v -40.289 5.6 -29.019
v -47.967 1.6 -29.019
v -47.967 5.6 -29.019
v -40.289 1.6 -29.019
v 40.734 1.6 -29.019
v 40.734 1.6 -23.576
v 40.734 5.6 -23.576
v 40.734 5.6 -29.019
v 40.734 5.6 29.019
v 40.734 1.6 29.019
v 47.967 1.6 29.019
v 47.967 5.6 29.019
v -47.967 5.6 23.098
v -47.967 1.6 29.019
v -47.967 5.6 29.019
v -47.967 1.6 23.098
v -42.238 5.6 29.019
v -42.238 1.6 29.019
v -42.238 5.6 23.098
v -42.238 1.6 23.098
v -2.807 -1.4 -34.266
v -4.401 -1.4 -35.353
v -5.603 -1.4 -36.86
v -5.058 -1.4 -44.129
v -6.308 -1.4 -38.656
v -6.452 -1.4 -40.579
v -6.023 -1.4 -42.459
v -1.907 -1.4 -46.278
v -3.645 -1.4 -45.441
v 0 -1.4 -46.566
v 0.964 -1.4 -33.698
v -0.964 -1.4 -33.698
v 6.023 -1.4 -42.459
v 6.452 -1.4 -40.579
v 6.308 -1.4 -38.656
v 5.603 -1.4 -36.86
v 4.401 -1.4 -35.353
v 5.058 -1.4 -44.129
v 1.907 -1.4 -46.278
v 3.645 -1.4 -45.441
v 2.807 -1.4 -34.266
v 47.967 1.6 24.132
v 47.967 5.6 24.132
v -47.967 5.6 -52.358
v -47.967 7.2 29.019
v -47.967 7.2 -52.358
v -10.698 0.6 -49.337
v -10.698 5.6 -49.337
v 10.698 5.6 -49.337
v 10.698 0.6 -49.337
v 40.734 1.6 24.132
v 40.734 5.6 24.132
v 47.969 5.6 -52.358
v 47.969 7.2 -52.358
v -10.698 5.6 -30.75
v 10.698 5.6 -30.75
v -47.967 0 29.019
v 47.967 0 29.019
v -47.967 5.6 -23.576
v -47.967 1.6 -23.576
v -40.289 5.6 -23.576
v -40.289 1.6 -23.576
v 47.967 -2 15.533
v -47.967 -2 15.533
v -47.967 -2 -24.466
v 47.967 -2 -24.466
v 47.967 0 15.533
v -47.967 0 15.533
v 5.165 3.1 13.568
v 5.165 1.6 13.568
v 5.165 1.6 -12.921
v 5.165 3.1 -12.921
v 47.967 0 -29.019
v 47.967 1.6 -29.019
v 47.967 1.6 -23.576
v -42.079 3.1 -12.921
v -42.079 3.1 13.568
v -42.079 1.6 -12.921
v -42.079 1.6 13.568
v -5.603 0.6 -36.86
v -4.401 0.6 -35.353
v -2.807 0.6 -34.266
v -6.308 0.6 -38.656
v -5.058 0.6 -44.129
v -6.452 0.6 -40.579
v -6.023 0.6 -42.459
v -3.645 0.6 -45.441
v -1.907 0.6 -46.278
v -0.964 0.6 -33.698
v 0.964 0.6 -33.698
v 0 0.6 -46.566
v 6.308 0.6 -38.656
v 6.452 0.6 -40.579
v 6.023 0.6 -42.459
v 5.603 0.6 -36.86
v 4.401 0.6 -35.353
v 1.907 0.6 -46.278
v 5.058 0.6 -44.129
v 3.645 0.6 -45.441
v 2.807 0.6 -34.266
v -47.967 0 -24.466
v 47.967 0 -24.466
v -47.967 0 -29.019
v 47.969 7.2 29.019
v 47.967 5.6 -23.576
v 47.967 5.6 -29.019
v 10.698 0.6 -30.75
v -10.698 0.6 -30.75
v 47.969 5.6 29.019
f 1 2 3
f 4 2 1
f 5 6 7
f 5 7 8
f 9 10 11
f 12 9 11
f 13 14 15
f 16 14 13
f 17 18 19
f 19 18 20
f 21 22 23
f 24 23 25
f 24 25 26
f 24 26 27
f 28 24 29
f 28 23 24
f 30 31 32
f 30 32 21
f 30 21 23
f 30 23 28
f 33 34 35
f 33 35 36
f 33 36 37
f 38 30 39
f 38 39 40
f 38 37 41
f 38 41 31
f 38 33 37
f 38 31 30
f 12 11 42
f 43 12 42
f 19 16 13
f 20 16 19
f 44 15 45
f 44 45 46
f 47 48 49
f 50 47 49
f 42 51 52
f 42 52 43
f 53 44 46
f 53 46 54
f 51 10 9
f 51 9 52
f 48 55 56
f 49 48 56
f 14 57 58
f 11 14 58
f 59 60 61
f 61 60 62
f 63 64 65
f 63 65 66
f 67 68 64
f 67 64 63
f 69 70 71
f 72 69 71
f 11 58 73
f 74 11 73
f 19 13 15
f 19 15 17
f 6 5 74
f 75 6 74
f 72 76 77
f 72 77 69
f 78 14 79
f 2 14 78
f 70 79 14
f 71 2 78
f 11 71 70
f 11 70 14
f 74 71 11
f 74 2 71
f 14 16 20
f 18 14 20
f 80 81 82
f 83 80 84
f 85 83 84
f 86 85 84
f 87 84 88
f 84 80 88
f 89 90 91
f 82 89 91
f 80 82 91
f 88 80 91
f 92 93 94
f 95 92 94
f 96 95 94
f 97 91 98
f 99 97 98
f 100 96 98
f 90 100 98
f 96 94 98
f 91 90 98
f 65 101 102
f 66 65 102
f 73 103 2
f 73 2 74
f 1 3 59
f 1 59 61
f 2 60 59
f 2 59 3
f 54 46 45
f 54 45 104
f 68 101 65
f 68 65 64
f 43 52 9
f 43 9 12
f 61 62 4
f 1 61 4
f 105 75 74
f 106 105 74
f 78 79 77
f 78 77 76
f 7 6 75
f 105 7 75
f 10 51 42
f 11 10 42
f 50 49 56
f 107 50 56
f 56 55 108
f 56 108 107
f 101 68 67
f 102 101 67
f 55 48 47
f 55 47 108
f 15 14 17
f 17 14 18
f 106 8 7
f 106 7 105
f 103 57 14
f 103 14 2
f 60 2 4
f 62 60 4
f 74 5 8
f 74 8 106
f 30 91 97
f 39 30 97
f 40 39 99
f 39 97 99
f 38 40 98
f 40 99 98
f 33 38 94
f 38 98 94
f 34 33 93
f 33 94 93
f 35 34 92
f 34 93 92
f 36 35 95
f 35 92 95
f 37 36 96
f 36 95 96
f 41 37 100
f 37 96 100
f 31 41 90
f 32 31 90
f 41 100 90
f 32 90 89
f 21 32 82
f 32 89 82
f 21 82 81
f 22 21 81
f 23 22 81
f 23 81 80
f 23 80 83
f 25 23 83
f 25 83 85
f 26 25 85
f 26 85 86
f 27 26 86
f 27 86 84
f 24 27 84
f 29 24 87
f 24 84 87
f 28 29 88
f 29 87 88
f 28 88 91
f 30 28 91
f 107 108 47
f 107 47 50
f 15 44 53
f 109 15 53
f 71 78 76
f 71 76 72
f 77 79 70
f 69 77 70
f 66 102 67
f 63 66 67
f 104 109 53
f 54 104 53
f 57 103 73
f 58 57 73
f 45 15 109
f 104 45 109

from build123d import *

# Parameters (mm, degrees)
SKETCH_1_W        = 95.933471424
SKETCH_1_H        = 58.037100116
EXTRUDE_1_DEPTH   = 1.6
SKETCH_2_W        = 7.677763417
SKETCH_2_H        = 5.44273959
EXTRUDE_2_DEPTH   = 4
SKETCH_2_W_2      = 5.728314019
SKETCH_2_H_2      = 5.920459935
EXTRUDE_2_2_DEPTH = 4
SKETCH_2_W_3      = 7.232783325
EXTRUDE_2_3_DEPTH = 4
SKETCH_2_H_3      = 4.886397559
EXTRUDE_2_4_DEPTH = 4
SKETCH_4_W        = 47.24386775
SKETCH_4_H        = 26.488980314
EXTRUDE_3_DEPTH   = 1.5
SKETCH_5_W        = 95.933471424
SKETCH_5_H        = 39.999042742
EXTRUDE_4_DEPTH   = 2
SKETCH_6_W        = 95.936200817
SKETCH_6_H        = 81.376254056
EXTRUDE_5_DEPTH   = 1.6
SKETCH_7_W        = 21.395648568
SKETCH_7_H        = 18.587106808
EXTRUDE_6_DEPTH   = 5
SKETCH_8_R        = 6.470047581
EXTRUDE_7_DEPTH   = 2


with BuildPart() as part:
    # 草图1 → 凸台-拉伸1 (new body)
    with BuildSketch(Plane(origin=(0, 0, 0), x_dir=(1, 0, 0), z_dir=(0, 1, 0))):
        Rectangle(SKETCH_1_W, SKETCH_1_H)
    extrude(amount=EXTRUDE_1_DEPTH)

    # 草图4 → 凸台-拉伸3 (add)
    with BuildSketch(Plane(origin=(0, 1.6, 0), x_dir=(1, 0, 0), z_dir=(0, 1, 0))):
        with Locations((-18.456617405, -0.323032298)):
            Rectangle(SKETCH_4_W, SKETCH_4_H)
    extrude(amount=EXTRUDE_3_DEPTH)


with BuildPart() as body_2:
    # 草图2 → 凸台-拉伸2 (new body)
    with BuildSketch(Plane(origin=(0, 1.6, 0), x_dir=(1, 0, 0), z_dir=(0, 1, 0))):
        with Locations((-44.127854004, 26.297180263)):
            Rectangle(SKETCH_2_W, SKETCH_2_H)
    extrude(amount=EXTRUDE_2_DEPTH)


with BuildPart() as body_3:
    # 草图2 → Extrude 2 2 (new body)
    with BuildSketch(Plane(origin=(0, 1.6, 0), x_dir=(1, 0, 0), z_dir=(0, 1, 0))):
        with Locations((-45.102578702, -26.058320091)):
            Rectangle(SKETCH_2_W_2, SKETCH_2_H_2)
    extrude(amount=EXTRUDE_2_2_DEPTH)


with BuildPart() as body_4:
    # 草图2 → Extrude 2 3 (new body)
    with BuildSketch(Plane(origin=(0, 1.6, 0), x_dir=(1, 0, 0), z_dir=(0, 1, 0))):
        with Locations((44.35034405, 26.297180263)):
            Rectangle(SKETCH_2_W_3, SKETCH_2_H)
    extrude(amount=EXTRUDE_2_3_DEPTH)


with BuildPart() as body_5:
    # 草图2 → Extrude 2 4 (new body)
    with BuildSketch(Plane(origin=(0, 1.6, 0), x_dir=(1, 0, 0), z_dir=(0, 1, 0))):
        with Locations((44.35034405, -26.575351279)):
            Rectangle(SKETCH_2_W_3, SKETCH_2_H_3)
    extrude(amount=EXTRUDE_2_4_DEPTH)


with BuildPart() as body_6:
    # 草图5 → 凸台-拉伸4 (new body)
    with BuildSketch(Plane.XZ):
        with Locations((0, -4.466732748)):
            Rectangle(SKETCH_5_W, SKETCH_5_H)
    extrude(amount=EXTRUDE_4_DEPTH)


with BuildPart() as body_7:
    # 草图6 → 凸台-拉伸5 (new body)
    with BuildSketch(Plane(origin=(0, 5.6, 0), x_dir=(1, 0, 0), z_dir=(0, 1, 0))):
        with Locations((0.001364697, 11.66957697)):
            Rectangle(SKETCH_6_W, SKETCH_6_H)
    extrude(amount=EXTRUDE_5_DEPTH)


with BuildPart() as body_8:
    # 草图7 → 凸台-拉伸6 (new body)
    with BuildSketch(Plane.XZ.offset(-5.6)):
        with Locations((0, -40.043215121)):
            Rectangle(SKETCH_7_W, SKETCH_7_H)
    extrude(amount=EXTRUDE_6_DEPTH)


with BuildPart() as body_9:
    # 草图8 → 凸台-拉伸7 (new body)
    with BuildSketch(Plane.XZ.offset(-0.6)):
        with Locations(Location((0, -40.095477716, 0), (0, 0, 270))):
            Circle(SKETCH_8_R)
    extrude(amount=EXTRUDE_7_DEPTH)


solid = Compound([part.part, body_2.part, body_3.part, body_4.part, body_5.part, body_6.part, body_7.part, body_8.part, body_9.part])
